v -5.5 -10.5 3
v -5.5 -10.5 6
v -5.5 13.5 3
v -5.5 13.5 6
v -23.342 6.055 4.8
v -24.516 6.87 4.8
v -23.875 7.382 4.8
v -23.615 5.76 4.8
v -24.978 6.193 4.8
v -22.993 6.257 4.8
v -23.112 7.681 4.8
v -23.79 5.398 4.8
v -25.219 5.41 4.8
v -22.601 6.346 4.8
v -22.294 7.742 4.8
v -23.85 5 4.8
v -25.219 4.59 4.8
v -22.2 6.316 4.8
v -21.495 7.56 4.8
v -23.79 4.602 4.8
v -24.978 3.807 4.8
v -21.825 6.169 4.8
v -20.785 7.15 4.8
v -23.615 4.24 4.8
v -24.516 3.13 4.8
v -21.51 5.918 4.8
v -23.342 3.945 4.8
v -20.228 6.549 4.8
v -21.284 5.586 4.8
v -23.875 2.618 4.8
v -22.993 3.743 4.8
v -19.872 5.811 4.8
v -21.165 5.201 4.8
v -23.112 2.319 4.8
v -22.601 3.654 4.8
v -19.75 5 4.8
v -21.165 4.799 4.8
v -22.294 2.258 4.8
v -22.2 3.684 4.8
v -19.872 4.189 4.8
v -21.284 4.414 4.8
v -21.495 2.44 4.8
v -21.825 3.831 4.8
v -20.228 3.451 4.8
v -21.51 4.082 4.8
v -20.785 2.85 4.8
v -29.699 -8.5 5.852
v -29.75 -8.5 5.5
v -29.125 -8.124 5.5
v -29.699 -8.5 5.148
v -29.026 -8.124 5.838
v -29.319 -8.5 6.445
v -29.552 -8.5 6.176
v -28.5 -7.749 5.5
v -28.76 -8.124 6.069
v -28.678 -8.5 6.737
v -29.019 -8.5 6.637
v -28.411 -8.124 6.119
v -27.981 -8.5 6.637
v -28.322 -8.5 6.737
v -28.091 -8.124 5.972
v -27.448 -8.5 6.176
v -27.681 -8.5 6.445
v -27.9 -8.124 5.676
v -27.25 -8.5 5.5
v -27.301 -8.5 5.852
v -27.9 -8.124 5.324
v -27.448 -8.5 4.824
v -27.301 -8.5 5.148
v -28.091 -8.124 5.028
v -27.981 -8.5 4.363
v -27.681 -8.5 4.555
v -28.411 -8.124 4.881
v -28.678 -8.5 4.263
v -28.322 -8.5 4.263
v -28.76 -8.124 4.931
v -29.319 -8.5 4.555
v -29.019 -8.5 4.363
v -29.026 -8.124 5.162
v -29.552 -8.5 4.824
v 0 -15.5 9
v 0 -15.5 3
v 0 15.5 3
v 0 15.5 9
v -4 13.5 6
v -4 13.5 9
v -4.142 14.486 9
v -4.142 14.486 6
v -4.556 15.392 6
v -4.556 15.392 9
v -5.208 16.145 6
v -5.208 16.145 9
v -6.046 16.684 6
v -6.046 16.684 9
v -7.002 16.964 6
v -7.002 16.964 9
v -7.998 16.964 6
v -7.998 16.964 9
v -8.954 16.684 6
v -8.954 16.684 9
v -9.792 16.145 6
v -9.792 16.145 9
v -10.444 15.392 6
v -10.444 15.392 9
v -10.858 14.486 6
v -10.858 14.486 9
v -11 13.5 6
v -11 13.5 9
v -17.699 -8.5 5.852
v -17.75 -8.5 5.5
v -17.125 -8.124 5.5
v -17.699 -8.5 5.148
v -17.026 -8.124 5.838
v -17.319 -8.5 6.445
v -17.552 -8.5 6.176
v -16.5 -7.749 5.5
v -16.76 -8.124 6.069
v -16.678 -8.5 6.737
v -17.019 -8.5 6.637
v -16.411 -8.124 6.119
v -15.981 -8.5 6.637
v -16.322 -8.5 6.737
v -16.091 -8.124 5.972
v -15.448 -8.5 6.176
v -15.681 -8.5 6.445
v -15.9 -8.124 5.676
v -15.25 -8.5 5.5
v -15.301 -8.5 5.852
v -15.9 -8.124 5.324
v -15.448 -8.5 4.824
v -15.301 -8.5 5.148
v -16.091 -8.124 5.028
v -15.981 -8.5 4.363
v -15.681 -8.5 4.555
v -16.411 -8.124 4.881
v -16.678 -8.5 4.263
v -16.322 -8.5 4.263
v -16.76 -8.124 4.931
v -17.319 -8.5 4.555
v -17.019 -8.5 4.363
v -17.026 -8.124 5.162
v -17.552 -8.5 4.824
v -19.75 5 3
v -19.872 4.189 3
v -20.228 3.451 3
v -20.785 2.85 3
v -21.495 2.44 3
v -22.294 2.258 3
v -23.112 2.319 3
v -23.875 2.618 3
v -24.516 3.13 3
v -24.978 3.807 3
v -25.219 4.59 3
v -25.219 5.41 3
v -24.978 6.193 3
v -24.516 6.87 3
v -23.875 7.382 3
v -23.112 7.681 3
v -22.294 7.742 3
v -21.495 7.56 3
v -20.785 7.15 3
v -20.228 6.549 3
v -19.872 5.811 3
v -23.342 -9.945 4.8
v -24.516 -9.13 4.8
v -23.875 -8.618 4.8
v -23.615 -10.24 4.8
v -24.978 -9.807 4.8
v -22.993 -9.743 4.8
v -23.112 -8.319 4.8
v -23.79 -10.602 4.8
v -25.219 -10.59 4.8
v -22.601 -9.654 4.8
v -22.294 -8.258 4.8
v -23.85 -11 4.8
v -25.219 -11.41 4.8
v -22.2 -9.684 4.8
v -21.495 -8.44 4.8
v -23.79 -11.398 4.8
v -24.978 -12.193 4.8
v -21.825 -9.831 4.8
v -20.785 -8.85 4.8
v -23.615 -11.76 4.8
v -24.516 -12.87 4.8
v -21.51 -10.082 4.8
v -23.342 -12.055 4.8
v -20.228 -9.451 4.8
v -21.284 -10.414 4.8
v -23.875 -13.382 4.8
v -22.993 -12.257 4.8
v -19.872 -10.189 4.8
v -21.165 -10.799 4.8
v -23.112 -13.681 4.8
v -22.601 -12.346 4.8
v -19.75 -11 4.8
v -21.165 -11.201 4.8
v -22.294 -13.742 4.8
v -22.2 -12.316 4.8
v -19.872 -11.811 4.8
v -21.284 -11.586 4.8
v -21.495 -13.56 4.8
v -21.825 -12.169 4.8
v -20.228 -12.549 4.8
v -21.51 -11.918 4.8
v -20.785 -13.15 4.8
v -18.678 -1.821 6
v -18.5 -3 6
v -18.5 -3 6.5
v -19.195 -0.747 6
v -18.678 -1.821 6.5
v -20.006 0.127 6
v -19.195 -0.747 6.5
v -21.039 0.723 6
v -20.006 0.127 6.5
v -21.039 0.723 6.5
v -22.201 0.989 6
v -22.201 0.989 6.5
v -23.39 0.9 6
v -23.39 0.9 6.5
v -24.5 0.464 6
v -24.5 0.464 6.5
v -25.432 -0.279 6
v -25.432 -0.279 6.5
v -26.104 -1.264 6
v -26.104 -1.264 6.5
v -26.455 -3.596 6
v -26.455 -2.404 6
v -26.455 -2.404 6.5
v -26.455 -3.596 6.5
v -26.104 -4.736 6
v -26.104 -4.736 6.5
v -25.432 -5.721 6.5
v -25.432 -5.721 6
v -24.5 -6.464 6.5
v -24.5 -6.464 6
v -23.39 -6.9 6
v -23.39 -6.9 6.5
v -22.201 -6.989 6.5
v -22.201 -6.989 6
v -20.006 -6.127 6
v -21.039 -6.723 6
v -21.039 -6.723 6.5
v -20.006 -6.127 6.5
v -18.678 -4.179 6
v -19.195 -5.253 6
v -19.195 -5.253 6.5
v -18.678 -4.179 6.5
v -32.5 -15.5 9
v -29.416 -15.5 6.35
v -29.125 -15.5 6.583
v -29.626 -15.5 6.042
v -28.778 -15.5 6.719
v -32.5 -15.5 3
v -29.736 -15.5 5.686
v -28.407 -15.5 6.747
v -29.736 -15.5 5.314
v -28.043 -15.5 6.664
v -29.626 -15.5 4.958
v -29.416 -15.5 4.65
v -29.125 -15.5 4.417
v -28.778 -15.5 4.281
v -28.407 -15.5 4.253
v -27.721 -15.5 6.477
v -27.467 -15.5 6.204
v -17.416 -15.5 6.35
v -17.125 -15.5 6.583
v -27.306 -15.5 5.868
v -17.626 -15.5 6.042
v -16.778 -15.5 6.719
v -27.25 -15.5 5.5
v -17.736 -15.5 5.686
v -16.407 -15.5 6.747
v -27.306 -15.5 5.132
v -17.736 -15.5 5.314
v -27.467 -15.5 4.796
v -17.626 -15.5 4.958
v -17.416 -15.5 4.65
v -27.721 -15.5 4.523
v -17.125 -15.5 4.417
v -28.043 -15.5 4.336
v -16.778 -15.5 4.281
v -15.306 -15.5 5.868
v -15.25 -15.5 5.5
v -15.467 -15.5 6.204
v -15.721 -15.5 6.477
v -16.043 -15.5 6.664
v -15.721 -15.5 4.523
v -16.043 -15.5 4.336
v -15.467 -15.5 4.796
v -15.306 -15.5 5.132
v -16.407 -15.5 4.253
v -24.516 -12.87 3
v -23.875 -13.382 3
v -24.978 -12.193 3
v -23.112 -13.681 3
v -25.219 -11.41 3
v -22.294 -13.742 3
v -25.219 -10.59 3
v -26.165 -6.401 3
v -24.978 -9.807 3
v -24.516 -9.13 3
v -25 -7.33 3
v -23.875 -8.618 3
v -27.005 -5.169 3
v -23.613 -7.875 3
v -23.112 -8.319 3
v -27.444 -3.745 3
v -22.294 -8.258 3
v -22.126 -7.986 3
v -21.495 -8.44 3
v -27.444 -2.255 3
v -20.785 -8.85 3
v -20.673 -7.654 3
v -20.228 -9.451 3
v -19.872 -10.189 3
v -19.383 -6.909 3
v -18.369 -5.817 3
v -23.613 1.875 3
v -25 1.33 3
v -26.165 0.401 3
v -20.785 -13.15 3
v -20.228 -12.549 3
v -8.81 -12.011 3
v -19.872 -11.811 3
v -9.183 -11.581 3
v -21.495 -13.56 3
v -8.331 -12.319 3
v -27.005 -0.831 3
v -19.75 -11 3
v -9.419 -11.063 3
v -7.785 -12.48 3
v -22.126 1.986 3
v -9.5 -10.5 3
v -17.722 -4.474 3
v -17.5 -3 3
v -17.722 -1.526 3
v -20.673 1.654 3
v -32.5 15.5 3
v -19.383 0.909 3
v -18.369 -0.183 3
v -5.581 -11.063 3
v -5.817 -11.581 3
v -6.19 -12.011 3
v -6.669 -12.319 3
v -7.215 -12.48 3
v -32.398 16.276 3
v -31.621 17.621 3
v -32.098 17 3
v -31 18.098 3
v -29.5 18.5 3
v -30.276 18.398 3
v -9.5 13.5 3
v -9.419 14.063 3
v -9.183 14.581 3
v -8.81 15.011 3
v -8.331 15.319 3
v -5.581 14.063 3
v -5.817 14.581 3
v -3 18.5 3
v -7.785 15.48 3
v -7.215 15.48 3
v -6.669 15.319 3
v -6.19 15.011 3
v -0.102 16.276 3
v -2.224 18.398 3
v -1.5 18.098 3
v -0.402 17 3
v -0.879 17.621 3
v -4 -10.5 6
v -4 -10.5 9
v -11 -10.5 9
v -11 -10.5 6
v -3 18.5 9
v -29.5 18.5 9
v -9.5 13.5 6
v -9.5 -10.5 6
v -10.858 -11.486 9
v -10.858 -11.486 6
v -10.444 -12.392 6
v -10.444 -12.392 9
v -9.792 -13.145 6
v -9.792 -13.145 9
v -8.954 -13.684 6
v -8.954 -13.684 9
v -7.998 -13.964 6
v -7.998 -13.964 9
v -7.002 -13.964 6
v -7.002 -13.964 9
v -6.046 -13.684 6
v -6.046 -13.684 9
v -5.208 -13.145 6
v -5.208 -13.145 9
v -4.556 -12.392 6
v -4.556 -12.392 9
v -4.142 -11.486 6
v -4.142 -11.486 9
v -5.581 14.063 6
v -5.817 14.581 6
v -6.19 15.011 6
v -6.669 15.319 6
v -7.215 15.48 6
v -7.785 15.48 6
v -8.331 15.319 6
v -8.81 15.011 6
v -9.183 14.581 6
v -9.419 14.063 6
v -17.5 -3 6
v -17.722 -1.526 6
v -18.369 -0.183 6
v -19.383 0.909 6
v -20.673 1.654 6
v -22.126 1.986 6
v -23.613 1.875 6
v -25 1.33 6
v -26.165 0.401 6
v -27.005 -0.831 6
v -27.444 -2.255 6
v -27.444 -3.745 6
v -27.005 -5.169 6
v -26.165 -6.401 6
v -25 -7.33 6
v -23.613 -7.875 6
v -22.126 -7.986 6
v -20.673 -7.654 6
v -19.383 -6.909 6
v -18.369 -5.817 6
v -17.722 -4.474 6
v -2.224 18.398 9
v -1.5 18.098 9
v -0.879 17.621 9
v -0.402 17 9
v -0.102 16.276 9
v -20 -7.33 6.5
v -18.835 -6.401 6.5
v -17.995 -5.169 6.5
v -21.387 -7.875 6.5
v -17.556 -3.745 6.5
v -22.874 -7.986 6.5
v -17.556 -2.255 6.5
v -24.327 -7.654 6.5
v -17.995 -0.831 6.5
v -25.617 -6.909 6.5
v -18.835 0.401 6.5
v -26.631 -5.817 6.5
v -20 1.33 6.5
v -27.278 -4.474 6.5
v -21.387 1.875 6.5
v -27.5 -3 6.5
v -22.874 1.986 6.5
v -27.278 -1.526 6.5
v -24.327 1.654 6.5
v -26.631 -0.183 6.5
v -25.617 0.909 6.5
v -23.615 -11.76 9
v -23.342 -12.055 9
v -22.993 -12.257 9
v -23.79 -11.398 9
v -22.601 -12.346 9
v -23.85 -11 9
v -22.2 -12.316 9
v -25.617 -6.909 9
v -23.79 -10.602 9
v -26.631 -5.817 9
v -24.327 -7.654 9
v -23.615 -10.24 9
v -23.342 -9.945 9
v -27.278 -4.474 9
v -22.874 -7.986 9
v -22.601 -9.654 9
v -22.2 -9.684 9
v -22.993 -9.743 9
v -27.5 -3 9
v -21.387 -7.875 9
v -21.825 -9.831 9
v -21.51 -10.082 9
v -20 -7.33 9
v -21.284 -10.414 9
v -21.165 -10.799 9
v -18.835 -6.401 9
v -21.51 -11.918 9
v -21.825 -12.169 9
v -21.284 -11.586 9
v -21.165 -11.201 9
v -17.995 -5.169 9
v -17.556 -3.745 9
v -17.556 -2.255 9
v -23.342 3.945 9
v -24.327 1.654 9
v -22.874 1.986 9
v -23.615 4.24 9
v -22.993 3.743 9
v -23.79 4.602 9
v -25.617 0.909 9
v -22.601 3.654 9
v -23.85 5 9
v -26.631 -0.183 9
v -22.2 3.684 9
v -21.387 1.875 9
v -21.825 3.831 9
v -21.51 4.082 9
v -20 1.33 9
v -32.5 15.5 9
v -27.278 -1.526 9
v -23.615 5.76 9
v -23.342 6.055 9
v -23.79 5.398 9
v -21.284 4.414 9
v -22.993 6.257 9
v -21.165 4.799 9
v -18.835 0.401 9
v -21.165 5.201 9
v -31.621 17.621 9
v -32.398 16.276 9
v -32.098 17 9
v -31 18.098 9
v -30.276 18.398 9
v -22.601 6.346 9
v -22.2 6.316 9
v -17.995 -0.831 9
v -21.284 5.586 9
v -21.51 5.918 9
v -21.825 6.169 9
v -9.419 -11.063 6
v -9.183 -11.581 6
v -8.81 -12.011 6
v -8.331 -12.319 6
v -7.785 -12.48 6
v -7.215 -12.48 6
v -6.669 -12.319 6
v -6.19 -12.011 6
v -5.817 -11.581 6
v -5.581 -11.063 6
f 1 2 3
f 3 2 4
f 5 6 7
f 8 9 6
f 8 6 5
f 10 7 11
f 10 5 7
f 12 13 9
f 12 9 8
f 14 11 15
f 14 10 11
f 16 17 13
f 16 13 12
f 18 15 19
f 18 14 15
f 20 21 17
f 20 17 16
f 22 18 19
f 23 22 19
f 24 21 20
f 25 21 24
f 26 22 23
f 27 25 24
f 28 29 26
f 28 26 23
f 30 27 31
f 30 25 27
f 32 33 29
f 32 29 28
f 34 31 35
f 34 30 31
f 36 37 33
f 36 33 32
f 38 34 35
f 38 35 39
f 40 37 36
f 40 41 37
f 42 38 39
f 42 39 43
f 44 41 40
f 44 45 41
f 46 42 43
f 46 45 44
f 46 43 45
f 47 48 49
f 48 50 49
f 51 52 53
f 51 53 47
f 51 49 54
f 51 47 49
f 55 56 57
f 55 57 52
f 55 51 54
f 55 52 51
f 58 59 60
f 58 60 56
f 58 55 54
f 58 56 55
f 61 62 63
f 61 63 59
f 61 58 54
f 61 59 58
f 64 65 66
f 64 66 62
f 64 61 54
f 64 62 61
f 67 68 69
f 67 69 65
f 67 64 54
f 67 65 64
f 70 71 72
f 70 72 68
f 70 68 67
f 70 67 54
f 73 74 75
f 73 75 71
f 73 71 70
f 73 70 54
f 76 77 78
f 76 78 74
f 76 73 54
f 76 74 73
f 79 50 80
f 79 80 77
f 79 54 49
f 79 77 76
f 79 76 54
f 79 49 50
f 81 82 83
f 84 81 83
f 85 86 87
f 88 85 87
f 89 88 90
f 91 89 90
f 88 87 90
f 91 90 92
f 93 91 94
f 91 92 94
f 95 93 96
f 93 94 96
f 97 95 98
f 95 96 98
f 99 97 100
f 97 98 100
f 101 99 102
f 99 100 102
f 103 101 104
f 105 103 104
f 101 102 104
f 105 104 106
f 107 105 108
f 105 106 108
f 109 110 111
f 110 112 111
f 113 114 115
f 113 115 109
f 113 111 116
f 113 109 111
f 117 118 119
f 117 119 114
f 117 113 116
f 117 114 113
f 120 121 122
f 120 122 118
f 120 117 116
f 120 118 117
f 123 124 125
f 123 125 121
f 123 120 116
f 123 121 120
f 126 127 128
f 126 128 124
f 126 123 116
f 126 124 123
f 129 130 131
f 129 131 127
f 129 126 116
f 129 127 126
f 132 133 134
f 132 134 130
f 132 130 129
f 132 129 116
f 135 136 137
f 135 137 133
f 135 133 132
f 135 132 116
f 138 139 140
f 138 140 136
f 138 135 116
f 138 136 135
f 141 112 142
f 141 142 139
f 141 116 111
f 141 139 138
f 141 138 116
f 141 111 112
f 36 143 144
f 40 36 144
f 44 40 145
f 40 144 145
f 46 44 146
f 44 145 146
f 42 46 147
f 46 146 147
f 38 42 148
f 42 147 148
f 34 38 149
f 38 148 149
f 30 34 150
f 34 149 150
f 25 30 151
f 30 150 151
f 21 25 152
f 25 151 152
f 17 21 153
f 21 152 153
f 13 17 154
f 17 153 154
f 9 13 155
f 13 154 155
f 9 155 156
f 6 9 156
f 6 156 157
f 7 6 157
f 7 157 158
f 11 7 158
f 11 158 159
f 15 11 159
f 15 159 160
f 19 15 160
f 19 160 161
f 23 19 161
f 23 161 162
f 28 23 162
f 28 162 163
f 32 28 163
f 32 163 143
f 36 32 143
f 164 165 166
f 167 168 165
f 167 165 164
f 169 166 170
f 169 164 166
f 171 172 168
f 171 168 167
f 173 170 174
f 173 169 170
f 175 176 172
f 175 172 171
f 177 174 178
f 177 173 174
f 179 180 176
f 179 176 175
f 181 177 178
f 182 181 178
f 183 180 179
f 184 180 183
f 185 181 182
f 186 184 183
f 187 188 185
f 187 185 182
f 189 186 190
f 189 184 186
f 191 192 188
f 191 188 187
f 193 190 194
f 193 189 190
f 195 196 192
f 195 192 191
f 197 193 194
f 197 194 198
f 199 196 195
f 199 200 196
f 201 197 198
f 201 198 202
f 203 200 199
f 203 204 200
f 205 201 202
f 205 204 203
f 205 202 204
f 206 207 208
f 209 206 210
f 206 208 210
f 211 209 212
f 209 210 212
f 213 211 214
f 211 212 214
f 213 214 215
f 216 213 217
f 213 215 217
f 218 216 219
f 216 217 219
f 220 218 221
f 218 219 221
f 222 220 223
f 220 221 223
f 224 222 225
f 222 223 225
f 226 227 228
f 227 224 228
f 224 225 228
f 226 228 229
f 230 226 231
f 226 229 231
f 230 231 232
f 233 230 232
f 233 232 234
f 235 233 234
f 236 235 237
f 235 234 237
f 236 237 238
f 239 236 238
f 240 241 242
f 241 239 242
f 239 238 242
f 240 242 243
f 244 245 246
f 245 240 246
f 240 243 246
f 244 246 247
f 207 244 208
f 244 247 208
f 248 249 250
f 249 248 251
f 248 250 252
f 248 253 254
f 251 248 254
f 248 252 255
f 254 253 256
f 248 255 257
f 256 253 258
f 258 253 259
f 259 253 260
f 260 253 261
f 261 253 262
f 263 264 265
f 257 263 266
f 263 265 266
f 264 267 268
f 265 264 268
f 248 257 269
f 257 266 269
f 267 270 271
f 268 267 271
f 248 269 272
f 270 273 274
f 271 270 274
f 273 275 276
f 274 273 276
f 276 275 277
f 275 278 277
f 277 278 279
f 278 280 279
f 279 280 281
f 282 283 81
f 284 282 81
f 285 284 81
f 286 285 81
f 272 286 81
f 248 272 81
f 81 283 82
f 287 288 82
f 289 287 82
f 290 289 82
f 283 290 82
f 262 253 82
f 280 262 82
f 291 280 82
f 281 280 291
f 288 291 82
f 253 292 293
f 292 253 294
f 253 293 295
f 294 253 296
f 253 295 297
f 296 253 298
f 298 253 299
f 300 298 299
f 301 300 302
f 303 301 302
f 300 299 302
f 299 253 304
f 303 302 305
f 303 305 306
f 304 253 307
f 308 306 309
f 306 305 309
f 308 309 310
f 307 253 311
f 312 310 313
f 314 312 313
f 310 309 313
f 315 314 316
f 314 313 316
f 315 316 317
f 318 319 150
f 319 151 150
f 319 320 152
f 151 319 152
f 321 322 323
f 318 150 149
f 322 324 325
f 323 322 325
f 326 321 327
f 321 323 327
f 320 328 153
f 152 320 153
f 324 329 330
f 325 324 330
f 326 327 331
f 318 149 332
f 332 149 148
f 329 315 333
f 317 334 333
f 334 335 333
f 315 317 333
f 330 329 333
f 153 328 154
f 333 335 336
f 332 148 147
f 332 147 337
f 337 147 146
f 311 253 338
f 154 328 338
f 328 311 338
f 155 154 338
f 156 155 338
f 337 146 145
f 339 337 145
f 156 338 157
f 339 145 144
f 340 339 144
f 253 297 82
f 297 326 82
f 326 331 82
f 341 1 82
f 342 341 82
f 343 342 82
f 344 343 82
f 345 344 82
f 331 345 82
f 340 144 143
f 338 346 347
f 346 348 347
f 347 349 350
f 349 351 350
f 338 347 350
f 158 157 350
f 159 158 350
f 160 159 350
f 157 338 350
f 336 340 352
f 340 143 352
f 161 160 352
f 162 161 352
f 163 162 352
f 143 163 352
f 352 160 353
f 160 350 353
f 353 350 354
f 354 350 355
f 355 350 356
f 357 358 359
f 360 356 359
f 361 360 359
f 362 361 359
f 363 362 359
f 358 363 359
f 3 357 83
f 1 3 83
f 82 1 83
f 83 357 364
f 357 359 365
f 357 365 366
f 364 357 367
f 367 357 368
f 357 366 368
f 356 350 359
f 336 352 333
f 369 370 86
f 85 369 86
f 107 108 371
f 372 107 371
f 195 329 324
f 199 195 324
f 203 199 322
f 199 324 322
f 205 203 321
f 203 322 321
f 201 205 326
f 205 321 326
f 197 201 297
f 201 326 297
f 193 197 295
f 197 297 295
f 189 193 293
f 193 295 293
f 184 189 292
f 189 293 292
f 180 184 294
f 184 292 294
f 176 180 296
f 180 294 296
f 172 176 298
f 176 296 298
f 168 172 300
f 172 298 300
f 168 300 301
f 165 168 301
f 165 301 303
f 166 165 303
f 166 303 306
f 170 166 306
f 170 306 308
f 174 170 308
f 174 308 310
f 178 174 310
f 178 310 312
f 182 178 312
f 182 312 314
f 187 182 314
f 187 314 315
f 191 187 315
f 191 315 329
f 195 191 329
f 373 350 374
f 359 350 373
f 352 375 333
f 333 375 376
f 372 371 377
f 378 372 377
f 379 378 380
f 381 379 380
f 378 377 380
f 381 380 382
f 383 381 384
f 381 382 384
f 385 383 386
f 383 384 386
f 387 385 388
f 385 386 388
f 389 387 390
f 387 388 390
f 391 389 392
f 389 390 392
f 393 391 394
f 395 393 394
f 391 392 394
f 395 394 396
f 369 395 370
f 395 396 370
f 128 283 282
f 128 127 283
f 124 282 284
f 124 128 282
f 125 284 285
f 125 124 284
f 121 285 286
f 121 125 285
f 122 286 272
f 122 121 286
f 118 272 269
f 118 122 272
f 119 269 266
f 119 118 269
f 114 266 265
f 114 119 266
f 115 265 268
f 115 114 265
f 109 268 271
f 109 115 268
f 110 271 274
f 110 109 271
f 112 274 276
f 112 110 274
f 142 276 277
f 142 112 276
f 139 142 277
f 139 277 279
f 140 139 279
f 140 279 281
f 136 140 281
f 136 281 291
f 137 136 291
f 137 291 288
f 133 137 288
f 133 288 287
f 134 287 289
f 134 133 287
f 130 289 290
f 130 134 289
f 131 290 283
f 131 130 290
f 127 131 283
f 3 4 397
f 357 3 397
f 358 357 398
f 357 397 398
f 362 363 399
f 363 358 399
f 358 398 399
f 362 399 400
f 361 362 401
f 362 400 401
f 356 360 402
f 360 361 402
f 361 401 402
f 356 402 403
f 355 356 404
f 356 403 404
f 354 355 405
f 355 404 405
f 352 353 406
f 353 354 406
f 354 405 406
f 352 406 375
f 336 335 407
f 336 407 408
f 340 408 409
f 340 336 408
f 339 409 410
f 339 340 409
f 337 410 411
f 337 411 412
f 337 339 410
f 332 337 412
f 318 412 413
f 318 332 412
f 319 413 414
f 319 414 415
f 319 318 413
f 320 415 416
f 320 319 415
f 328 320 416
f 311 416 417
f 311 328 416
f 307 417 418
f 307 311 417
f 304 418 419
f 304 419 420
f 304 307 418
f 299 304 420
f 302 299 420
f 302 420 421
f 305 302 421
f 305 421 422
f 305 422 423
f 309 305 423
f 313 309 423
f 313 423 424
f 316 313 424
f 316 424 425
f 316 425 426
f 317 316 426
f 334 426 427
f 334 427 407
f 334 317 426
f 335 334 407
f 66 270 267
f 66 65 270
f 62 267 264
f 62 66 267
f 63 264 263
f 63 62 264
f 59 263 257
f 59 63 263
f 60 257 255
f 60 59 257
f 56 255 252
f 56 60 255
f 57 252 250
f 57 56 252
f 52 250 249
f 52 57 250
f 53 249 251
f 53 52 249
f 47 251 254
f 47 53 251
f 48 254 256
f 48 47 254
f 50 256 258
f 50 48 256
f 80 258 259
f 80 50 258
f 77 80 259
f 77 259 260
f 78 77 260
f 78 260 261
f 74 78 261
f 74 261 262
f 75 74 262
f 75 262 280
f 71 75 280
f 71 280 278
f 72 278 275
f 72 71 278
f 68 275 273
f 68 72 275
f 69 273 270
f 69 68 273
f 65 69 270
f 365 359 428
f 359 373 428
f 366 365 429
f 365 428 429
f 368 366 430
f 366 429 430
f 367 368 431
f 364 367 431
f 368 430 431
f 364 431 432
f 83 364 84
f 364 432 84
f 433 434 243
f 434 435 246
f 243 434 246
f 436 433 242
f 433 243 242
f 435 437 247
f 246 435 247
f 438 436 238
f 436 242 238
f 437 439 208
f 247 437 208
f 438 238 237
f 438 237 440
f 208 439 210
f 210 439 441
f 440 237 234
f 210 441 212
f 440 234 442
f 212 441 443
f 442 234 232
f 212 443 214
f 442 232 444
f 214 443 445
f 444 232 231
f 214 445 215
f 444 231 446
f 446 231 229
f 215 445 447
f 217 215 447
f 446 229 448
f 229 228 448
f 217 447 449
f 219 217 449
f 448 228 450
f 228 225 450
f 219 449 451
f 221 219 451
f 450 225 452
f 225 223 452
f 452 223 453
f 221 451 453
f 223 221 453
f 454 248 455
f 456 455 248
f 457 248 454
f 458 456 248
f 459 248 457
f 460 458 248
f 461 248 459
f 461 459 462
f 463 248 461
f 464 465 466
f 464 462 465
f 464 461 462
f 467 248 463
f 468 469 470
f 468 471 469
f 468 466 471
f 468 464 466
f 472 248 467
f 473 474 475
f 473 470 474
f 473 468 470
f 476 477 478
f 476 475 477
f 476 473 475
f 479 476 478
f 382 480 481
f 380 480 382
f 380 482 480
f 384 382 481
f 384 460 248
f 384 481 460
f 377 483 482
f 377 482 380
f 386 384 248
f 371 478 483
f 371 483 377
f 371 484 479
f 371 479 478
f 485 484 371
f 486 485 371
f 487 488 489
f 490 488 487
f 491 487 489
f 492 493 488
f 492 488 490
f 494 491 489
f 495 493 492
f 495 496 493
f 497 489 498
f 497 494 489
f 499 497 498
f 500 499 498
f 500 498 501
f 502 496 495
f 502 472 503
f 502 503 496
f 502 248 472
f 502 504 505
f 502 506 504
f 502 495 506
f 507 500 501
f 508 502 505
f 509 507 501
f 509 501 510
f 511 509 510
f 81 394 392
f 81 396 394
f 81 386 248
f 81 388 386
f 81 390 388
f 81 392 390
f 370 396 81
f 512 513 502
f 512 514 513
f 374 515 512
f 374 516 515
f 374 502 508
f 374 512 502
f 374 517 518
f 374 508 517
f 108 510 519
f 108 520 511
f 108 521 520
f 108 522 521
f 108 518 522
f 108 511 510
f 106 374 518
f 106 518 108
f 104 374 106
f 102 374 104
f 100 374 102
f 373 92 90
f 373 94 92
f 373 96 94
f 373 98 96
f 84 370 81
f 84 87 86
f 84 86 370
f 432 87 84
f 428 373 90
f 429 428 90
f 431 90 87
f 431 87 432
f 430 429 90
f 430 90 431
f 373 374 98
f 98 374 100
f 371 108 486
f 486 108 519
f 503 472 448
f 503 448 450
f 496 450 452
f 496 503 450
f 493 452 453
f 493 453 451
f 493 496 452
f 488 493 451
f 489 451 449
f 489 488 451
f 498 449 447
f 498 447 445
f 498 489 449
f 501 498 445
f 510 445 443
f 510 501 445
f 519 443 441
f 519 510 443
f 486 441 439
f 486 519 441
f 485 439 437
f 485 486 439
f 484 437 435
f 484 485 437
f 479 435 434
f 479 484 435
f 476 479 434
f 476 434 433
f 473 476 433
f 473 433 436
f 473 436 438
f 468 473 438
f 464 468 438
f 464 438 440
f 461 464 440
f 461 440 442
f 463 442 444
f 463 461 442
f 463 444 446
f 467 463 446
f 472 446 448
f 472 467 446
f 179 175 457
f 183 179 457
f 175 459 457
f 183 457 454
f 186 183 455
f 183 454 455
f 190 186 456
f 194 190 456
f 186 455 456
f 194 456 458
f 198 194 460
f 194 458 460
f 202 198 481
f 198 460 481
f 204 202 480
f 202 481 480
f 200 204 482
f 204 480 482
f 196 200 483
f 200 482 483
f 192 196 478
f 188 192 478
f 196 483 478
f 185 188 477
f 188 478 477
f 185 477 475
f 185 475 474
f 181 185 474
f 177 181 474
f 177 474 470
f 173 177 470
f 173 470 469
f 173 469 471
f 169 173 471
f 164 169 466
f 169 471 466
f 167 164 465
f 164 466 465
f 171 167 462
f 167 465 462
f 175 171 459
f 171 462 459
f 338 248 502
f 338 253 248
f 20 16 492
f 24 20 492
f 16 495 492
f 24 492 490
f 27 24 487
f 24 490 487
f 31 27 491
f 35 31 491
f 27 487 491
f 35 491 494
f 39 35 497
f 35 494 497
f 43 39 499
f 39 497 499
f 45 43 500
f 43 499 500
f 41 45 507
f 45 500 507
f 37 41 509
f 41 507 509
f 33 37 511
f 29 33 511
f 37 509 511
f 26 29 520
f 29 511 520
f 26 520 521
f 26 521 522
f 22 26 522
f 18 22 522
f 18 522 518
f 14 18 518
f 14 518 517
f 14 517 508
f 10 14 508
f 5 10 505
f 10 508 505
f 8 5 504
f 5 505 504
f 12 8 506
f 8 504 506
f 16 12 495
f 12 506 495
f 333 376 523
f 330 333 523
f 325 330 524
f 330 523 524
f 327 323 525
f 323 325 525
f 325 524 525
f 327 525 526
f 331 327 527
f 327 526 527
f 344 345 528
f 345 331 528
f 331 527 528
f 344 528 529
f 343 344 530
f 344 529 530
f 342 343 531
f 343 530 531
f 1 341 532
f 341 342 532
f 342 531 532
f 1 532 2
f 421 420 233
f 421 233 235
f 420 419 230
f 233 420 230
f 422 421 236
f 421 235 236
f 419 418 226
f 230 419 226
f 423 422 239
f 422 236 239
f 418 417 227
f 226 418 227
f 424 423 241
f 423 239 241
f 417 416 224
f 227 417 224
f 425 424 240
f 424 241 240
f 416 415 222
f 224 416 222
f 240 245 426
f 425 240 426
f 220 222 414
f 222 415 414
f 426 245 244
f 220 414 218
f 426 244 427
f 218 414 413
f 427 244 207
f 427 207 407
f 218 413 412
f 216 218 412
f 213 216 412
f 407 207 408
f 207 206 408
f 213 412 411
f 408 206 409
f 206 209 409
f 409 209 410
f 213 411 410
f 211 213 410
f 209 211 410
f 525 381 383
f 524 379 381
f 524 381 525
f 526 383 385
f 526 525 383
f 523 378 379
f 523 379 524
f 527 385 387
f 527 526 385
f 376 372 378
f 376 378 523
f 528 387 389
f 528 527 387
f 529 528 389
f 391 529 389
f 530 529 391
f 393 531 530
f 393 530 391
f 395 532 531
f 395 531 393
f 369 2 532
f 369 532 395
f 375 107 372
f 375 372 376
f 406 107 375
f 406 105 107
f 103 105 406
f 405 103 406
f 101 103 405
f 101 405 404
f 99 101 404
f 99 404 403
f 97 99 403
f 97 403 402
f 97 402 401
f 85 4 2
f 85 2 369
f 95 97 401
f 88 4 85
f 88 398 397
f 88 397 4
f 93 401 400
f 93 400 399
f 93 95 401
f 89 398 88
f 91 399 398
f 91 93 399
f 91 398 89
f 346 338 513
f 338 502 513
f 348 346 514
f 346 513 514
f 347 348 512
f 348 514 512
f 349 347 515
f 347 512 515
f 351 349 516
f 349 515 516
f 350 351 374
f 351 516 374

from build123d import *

# Parameters (mm, degrees)
SKIZZE1_W                                            = 65
SKIZZE1_H                                            = 34
SKIZZE1_R                                            = 9
SKIZZE1_R_2                                          = 4
AUFSATZ_LINEAR_AUSTRAGEN1_DEPTH                      = 3
SCHNITT_LINEAR_START                                 = 3
SKIZZE1_3_R                                          = 10.5
SCHNITT_LINEAR_AUSTRAGEN1_DEPTH                      = 5
SKIZZE1_4_R                                          = 5
SCHNITT_LINEAR_AUSTRAGEN2_DEPTH                      = 3
SCHNITT_LINEAR_AUSTRAGEN4_DEPTH                      = 7
SCHNITT_LINEAR_AUSTRAGEN5_DEPTH                      = 3
VERRUNDUNG1_R                                        = 3
M3_GEWINDEBOHRUNG1_D                                 = 2.5
M3_GEWINDEBOHRUNG1_DEPTH                             = 7
M3_GEWINDEBOHRUNG1_TIP                               = 0.751075774
M3_GEWINDEBOHRUNG2_D                                 = 2.5
M3_GEWINDEBOHRUNG2_DEPTH                             = 7.5
M3_GEWINDEBOHRUNG2_TIP                               = 0.751075774
SKIZZE6_3_OUTSIDE_W                                  = 81.72
SKIZZE6_3_OUTSIDE_H                                  = 50.72
SKIZZE6_3_OUTSIDE_W_2                                = 32.5
SKIZZE6_3_OUTSIDE_H_2                                = 34
NUR_ANTRIEB_DEPTH                                    = 7
VERRUNDUNG3_R                                        = 3
SKIZZE7_R                                            = 5
SCHNITT_LINEAR_AUSTRAGEN3_DEPTH                      = 2.5
STIRNSENKUNG_F_R_M2_5_ZYLINDERSCHRAUBE_M_D           = 2.7
STIRNSENKUNG_F_R_M2_5_ZYLINDERSCHRAUBE_M_CBORE_D     = 5.5
STIRNSENKUNG_F_R_M2_5_ZYLINDERSCHRAUBE_M_CBORE_DEPTH = 1.8


with BuildPart() as part:
    # Skizze1 → Aufsatz-Linear austragen1 (new body, symmetric)
    with BuildSketch(Plane.XY):
        with Locations((0, 1.5)):
            Rectangle(SKIZZE1_W, SKIZZE1_H)
        with Locations((20.5, 0)):
            Circle(SKIZZE1_R, mode=Mode.SUBTRACT)
        with Locations((-22.5, -3)):
            Circle(SKIZZE1_R_2, mode=Mode.SUBTRACT)
    extrude(amount=AUFSATZ_LINEAR_AUSTRAGEN1_DEPTH, both=True)

    # Skizze1<3> → Schnitt-Linear austragen1 (cut)
    with BuildSketch(Plane.XY.offset(SCHNITT_LINEAR_START)):
        with Locations((20.5, 0)):
            Circle(SKIZZE1_3_R)
    extrude(amount=-SCHNITT_LINEAR_AUSTRAGEN1_DEPTH, mode=Mode.SUBTRACT)

    # Skizze1<4> → Schnitt-Linear austragen2 (cut)
    with BuildSketch(Plane.XY.offset(SCHNITT_LINEAR_START)):
        with Locations((-22.5, -3)):
            Circle(SKIZZE1_4_R)
    extrude(amount=-SCHNITT_LINEAR_AUSTRAGEN2_DEPTH, mode=Mode.SUBTRACT)

    # Skizze11 → Schnitt-Linear austragen4 (cut, through all)
    with BuildSketch(Plane(origin=(0, 0, -3), x_dir=(-1, 0, 0), z_dir=(0, 0, -1))):
        with BuildLine():
            Line((9.5, 13.5), (9.5, -10.5))
            ThreePointArc((9.5, -10.5), (7.5, -12.5), (5.5, -10.5))
            Line((5.5, -10.5), (5.5, 13.5))
            ThreePointArc((5.5, 13.5), (7.5, 15.5), (9.5, 13.5))
        make_face()
    extrude(amount=-SCHNITT_LINEAR_AUSTRAGEN4_DEPTH, mode=Mode.SUBTRACT)

    # Skizze11<4> → Schnitt-Linear austragen5 (cut)
    with BuildSketch(Plane(origin=(0, 0, -3), x_dir=(-1, 0, 0), z_dir=(0, 0, -1))):
        with BuildLine():
            Line((11, 13.5), (11, -10.5))
            ThreePointArc((11, -10.5), (7.5, -14), (4, -10.5))
            Line((4, -10.5), (4, 13.5))
            ThreePointArc((4, 13.5), (7.5, 17), (11, 13.5))
        make_face()
    extrude(amount=-SCHNITT_LINEAR_AUSTRAGEN5_DEPTH, mode=Mode.SUBTRACT)

    # Verrundung1
    verrundung1_edges = [part.edges().sort_by_distance(p)[0] for p in [
        (-32.5, 18.5, 0),
        (32.5, 18.5, 0),
    ]]
    fillet(verrundung1_edges, radius=VERRUNDUNG1_R)

    # M3 Gewindebohrung1
    with Locations(Plane(origin=(-30, -15.5, -6.25), x_dir=(-1, 0, 0), z_dir=(0, -1, 0))):
        with Locations((-56.5, -6.75), (-1.5, -6.75), (-44.5, -6.75), (-13.5, -6.75)):
            Hole(M3_GEWINDEBOHRUNG1_D / 2, depth=M3_GEWINDEBOHRUNG1_DEPTH)
            with Locations((0, 0, -(M3_GEWINDEBOHRUNG1_DEPTH + M3_GEWINDEBOHRUNG1_TIP / 2))):  # 118° drill point
                Cone(0, M3_GEWINDEBOHRUNG1_D / 2, M3_GEWINDEBOHRUNG1_TIP, mode=Mode.SUBTRACT)

    # M3 Gewindebohrung2
    with Locations(Plane(origin=(0, 18.5, 0), x_dir=(1, 0, 0), z_dir=(0, 1, 0))):
        with Locations((20.5, 0)):
            Hole(M3_GEWINDEBOHRUNG2_D / 2, depth=M3_GEWINDEBOHRUNG2_DEPTH)
            with Locations((0, 0, -(M3_GEWINDEBOHRUNG2_DEPTH + M3_GEWINDEBOHRUNG2_TIP / 2))):  # 118° drill point
                Cone(0, M3_GEWINDEBOHRUNG2_D / 2, M3_GEWINDEBOHRUNG2_TIP, mode=Mode.SUBTRACT)


with BuildPart() as body_2:
    # Spiegeln1: mirrored copy
    add(part.part.mirror(Plane.XY.offset(3)))

    # Skizze6<3> outside → Nur Antrieb (cut, through all)
    with BuildSketch(Plane(origin=(0, 0, 3), x_dir=(-1, 0, 0), z_dir=(0, 0, -1))):
        with Locations((0, 1.5)):
            Rectangle(SKIZZE6_3_OUTSIDE_W, SKIZZE6_3_OUTSIDE_H)
        with Locations((16.25, 1.5)):
            Rectangle(SKIZZE6_3_OUTSIDE_W_2, SKIZZE6_3_OUTSIDE_H_2, mode=Mode.SUBTRACT)
    extrude(amount=-NUR_ANTRIEB_DEPTH, mode=Mode.SUBTRACT)

    # Verrundung3
    verrundung3_edges = [body_2.edges().sort_by_distance(p)[0] for p in [
        (0, 18.5, 6),
    ]]
    fillet(verrundung3_edges, radius=VERRUNDUNG3_R)

    # Skizze7 → Schnitt-Linear austragen3 (cut)
    with BuildSketch(Plane(origin=(0, 0, 9), x_dir=(-1, 0, 0), z_dir=(0, 0, -1))):
        with Locations((22.5, -3)):
            Circle(SKIZZE7_R)
    extrude(amount=SCHNITT_LINEAR_AUSTRAGEN3_DEPTH, mode=Mode.SUBTRACT)

    # Stirnsenkung für  M2.5 Zylinderschraube mit Schlitz/Kreuzschlitz1 (through all)
    with Locations(Plane(origin=(6.813962519, -2.610238453, 3), x_dir=(1, 0, 0), z_dir=(0, 0, -1))):
        with Locations((-29.313962519, -7.610238453), (-29.313962519, 8.389761547)):
            CounterBoreHole(STIRNSENKUNG_F_R_M2_5_ZYLINDERSCHRAUBE_M_D / 2, STIRNSENKUNG_F_R_M2_5_ZYLINDERSCHRAUBE_M_CBORE_D / 2, STIRNSENKUNG_F_R_M2_5_ZYLINDERSCHRAUBE_M_CBORE_DEPTH)


solid = body_2.part
